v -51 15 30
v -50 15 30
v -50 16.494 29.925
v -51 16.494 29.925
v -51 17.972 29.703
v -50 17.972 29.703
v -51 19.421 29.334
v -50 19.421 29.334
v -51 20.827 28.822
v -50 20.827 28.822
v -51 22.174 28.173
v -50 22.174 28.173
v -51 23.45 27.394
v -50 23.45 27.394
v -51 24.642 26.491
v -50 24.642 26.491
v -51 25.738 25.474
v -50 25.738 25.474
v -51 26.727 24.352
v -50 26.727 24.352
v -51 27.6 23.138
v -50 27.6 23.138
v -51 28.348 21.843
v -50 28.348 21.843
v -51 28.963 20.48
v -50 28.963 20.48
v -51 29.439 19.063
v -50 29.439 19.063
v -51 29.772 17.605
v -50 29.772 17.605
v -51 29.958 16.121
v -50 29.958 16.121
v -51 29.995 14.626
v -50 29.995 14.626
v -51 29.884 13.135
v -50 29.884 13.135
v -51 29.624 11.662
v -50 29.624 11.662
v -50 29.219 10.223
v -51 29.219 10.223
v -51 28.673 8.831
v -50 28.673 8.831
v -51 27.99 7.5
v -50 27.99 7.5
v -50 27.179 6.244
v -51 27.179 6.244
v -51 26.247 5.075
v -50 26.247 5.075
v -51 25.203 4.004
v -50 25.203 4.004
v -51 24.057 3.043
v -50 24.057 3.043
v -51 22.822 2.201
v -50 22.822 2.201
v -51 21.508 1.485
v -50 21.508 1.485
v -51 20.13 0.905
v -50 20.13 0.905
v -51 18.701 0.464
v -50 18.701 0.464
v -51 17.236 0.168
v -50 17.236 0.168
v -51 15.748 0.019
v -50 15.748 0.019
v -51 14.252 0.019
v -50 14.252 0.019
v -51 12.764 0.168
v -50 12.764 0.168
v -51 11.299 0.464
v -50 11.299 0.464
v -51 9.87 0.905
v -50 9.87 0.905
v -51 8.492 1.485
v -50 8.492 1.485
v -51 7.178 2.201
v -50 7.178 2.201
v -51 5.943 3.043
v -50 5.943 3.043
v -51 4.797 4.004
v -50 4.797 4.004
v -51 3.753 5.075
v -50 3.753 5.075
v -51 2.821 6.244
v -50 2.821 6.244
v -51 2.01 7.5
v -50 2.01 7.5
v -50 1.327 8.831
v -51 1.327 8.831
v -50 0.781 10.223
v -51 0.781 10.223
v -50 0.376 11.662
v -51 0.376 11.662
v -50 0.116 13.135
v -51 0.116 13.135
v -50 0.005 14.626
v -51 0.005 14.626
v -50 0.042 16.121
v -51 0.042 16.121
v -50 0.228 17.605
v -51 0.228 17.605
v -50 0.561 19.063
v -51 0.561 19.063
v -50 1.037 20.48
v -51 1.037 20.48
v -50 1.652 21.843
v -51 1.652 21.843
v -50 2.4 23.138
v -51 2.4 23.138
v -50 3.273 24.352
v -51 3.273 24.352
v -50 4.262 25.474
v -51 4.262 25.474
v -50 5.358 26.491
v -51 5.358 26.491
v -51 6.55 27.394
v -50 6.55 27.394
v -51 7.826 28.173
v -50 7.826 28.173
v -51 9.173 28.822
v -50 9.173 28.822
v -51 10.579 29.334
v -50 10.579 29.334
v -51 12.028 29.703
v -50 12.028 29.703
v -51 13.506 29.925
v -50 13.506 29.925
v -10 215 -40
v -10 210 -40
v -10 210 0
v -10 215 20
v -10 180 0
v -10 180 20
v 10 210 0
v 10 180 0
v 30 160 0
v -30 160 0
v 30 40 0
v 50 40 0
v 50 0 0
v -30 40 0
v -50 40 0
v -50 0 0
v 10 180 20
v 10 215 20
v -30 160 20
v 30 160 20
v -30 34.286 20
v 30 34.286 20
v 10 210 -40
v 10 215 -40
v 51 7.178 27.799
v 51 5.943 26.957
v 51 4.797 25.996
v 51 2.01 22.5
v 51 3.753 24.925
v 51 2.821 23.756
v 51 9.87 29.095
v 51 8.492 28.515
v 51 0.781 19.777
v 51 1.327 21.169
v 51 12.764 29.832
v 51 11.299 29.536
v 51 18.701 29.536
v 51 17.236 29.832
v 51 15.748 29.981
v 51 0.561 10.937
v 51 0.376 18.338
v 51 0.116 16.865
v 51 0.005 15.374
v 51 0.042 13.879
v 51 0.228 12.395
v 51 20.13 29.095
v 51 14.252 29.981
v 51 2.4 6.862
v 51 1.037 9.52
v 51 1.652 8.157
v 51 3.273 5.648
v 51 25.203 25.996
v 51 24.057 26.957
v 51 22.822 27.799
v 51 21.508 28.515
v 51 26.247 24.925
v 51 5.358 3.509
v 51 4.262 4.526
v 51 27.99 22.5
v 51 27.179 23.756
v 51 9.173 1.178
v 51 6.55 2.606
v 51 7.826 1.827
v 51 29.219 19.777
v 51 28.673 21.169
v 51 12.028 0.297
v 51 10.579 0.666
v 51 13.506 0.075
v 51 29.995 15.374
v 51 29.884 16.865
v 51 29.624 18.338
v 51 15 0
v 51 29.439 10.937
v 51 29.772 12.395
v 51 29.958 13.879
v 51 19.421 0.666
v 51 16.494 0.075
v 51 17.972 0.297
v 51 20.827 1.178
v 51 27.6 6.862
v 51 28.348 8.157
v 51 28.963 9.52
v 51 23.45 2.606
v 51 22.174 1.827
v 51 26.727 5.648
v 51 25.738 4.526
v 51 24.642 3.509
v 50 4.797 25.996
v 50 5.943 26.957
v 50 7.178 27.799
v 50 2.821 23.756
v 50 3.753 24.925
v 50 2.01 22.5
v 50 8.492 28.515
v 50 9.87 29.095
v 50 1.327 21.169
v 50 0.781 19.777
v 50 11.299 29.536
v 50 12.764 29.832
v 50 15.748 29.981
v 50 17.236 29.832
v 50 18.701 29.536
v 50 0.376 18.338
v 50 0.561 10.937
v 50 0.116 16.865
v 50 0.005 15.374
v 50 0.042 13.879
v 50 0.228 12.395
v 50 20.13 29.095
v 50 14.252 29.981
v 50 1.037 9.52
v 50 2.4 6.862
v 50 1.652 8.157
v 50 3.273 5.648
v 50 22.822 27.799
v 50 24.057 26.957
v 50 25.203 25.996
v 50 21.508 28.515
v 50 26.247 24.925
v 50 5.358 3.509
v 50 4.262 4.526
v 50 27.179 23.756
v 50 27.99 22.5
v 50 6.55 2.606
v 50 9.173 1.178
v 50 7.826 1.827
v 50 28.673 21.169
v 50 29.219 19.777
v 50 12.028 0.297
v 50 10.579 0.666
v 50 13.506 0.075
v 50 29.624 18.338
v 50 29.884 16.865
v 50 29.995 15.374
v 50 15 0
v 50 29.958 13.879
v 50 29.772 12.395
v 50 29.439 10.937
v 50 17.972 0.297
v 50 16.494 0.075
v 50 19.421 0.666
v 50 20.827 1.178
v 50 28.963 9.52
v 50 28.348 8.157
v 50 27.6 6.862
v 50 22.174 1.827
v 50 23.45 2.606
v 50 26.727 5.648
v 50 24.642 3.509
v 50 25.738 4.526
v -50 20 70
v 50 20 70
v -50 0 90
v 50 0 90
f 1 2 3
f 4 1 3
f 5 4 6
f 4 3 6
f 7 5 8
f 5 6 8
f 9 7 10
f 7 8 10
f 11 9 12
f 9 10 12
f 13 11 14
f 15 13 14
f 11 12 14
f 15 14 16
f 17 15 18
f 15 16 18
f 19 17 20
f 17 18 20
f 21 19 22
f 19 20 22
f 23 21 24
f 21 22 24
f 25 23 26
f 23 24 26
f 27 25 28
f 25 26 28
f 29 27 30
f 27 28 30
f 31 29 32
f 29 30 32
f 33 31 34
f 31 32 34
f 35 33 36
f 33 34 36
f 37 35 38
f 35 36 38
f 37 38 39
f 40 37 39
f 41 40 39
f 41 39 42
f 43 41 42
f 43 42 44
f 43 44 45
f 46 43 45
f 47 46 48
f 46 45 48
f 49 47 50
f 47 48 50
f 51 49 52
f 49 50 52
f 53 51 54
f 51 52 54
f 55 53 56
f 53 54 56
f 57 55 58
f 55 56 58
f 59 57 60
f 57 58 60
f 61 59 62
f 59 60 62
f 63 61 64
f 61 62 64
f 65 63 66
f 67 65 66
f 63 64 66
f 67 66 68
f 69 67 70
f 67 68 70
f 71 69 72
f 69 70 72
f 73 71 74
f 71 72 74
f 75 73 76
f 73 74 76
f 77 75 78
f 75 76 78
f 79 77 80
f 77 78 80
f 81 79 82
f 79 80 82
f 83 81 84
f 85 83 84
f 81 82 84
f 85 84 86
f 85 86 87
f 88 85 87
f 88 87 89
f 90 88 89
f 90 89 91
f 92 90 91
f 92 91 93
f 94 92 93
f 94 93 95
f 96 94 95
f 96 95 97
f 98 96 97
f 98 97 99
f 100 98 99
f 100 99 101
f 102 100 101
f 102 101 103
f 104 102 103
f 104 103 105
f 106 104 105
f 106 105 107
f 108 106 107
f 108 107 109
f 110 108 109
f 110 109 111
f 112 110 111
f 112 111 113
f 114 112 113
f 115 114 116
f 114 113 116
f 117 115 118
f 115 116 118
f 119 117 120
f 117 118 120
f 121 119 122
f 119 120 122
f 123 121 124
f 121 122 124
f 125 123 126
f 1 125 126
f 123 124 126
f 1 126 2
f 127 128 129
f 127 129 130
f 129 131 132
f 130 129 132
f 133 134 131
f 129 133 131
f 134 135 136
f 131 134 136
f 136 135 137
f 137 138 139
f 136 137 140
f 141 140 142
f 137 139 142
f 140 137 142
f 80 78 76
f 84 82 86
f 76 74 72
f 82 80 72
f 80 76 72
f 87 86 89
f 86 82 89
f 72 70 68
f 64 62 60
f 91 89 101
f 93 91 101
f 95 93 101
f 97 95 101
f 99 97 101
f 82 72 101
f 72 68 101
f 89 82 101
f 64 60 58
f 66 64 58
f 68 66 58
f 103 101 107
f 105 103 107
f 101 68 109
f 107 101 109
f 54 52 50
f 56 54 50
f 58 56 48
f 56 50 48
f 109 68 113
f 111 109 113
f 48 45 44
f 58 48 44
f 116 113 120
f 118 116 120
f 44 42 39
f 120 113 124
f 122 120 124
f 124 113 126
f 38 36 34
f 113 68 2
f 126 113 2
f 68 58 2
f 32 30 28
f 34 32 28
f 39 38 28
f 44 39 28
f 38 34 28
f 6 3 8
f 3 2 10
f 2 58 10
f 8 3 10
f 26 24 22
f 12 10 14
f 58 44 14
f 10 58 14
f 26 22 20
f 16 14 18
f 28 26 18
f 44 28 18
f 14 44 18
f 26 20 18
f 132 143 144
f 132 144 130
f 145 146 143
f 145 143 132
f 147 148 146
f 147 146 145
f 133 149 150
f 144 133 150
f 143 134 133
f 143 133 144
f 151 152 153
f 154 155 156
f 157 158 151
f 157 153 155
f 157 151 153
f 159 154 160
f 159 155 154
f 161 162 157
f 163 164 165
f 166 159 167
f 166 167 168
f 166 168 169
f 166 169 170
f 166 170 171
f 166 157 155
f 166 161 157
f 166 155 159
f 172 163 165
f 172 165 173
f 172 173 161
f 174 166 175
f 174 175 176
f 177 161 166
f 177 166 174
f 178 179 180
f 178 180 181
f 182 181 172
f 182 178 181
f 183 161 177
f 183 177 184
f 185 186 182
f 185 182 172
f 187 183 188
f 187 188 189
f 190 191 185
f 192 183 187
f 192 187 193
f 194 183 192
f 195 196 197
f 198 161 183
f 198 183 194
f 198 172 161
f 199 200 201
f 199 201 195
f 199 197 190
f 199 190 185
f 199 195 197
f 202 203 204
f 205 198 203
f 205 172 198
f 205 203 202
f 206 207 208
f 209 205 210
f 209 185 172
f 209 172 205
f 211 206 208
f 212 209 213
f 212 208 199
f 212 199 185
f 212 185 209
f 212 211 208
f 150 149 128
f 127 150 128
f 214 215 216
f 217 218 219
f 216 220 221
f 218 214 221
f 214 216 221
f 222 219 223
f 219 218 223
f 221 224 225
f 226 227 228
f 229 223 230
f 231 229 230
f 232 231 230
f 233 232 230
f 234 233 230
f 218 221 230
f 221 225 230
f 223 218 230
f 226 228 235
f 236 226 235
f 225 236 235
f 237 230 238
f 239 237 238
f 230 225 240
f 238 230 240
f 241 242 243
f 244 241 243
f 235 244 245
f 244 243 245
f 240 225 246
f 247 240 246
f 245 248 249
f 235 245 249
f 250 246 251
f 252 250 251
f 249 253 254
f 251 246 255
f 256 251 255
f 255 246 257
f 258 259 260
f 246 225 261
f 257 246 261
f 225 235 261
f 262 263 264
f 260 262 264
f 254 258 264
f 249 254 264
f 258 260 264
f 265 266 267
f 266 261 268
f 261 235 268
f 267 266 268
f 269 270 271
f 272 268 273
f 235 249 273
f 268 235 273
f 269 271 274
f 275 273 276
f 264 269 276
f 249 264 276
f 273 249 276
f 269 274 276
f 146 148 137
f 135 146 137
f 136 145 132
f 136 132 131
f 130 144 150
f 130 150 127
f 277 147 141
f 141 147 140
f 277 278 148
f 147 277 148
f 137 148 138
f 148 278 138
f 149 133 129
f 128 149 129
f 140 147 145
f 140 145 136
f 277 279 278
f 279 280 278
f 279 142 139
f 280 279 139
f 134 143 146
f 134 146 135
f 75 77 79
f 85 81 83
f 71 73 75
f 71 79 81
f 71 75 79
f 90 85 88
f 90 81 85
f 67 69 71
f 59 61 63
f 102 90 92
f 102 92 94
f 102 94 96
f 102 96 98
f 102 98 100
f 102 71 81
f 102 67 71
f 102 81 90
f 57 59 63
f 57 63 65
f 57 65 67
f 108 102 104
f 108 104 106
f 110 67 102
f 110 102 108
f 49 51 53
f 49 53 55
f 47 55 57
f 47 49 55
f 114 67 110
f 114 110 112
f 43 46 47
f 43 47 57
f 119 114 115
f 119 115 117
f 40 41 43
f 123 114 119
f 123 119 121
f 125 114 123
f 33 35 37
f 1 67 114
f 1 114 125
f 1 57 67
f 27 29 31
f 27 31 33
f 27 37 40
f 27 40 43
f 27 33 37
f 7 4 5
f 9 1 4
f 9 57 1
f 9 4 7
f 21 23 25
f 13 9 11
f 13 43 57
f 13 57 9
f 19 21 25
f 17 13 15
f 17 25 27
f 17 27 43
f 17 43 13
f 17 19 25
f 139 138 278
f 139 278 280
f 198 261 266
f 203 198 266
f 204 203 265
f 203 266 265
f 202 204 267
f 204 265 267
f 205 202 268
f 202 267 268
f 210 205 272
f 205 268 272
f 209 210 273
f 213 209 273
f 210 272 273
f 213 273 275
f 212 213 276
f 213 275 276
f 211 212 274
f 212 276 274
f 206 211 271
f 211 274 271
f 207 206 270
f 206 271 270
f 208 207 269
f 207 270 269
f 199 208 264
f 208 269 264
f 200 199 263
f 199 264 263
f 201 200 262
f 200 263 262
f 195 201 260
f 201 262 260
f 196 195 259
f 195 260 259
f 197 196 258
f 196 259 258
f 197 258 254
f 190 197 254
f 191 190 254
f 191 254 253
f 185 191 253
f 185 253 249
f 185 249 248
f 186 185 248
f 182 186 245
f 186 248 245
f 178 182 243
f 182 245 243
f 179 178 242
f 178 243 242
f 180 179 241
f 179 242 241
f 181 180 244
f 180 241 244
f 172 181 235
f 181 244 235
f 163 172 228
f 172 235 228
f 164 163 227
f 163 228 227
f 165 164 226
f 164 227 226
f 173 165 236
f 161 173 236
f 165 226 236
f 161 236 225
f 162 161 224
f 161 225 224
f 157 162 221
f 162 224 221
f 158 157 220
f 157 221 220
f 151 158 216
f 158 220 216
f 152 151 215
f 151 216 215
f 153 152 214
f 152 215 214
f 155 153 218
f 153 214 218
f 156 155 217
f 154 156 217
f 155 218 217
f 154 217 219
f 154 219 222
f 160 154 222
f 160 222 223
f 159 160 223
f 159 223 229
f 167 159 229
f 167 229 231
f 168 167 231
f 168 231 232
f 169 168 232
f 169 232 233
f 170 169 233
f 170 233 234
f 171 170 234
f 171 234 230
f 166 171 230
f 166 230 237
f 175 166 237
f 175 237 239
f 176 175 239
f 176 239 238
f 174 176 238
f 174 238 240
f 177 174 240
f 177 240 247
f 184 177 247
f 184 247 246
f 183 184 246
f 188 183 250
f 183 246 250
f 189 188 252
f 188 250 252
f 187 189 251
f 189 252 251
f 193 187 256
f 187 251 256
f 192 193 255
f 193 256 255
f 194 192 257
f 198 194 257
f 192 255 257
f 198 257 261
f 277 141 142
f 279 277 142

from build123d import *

# Parameters (mm, degrees)
EXTRUDE1_DEPTH = 50
SKETCH2_R      = 15
EXTRUDE2_DEPTH = 1
SKETCH3_R      = 15
EXTRUDE3_DEPTH = 1
SKETCH4_W      = 60
SKETCH4_H      = 20
EXTRUDE4_DEPTH = 180
CHAMFER1_SIZE  = 20
SKETCH5_W      = 20
SKETCH5_H      = 20
EXTRUDE5_DEPTH = 30
SKETCH6_W      = 20
SKETCH6_H      = 60
EXTRUDE6_DEPTH = 5


with BuildPart() as part:
    # Sketch1 → Extrude1 (new body, symmetric)
    with BuildSketch(Plane(origin=(0, 0, 0), x_dir=(0, 0, -1), z_dir=(1, 0, 0))):
        Polygon((0, 40), (0, 0), (-90, 0), (-70, 20), align=None)
    extrude(amount=EXTRUDE1_DEPTH, both=True)

    # Sketch4 → Extrude4 (add)
    with BuildSketch(Plane(origin=(0, 0, 0), x_dir=(1, 0, 0), z_dir=(0, 1, 0))):
        with Locations((0, -10)):
            Rectangle(SKETCH4_W, SKETCH4_H)
    extrude(amount=EXTRUDE4_DEPTH)

    # Chamfer1
    chamfer1_edges = [part.edges().sort_by_distance(p)[0] for p in [
        (-30, 180, 10),
        (30, 180, 10),
    ]]
    chamfer(chamfer1_edges, length=CHAMFER1_SIZE)

    # Sketch5 → Extrude5 (add)
    with BuildSketch(Plane(origin=(0, 180, 0), x_dir=(-1, 0, 0), z_dir=(0, 1, 0))):
        with Locations((0, 10)):
            Rectangle(SKETCH5_W, SKETCH5_H)
    extrude(amount=EXTRUDE5_DEPTH)

    # Sketch6 → Extrude6 (add)
    with BuildSketch(Plane(origin=(0, 210, 0), x_dir=(-1, 0, 0), z_dir=(0, 1, 0))):
        with Locations((0, -10)):
            Rectangle(SKETCH6_W, SKETCH6_H)
    extrude(amount=EXTRUDE6_DEPTH)


with BuildPart() as body_2:
    # Sketch2 → Extrude2 (new body)
    with BuildSketch(Plane(origin=(50, 0, 0), x_dir=(0, 0, -1), z_dir=(1, 0, 0))):
        with Locations((-15, 15)):
            Circle(SKETCH2_R)
    extrude(amount=EXTRUDE2_DEPTH)


with BuildPart() as body_3:
    # Sketch3 → Extrude3 (new body)
    with BuildSketch(Plane.ZY.offset(50)):
        with Locations((15, 15)):
            Circle(SKETCH3_R)
    extrude(amount=EXTRUDE3_DEPTH)


solid = Compound([part.part, body_2.part, body_3.part])
